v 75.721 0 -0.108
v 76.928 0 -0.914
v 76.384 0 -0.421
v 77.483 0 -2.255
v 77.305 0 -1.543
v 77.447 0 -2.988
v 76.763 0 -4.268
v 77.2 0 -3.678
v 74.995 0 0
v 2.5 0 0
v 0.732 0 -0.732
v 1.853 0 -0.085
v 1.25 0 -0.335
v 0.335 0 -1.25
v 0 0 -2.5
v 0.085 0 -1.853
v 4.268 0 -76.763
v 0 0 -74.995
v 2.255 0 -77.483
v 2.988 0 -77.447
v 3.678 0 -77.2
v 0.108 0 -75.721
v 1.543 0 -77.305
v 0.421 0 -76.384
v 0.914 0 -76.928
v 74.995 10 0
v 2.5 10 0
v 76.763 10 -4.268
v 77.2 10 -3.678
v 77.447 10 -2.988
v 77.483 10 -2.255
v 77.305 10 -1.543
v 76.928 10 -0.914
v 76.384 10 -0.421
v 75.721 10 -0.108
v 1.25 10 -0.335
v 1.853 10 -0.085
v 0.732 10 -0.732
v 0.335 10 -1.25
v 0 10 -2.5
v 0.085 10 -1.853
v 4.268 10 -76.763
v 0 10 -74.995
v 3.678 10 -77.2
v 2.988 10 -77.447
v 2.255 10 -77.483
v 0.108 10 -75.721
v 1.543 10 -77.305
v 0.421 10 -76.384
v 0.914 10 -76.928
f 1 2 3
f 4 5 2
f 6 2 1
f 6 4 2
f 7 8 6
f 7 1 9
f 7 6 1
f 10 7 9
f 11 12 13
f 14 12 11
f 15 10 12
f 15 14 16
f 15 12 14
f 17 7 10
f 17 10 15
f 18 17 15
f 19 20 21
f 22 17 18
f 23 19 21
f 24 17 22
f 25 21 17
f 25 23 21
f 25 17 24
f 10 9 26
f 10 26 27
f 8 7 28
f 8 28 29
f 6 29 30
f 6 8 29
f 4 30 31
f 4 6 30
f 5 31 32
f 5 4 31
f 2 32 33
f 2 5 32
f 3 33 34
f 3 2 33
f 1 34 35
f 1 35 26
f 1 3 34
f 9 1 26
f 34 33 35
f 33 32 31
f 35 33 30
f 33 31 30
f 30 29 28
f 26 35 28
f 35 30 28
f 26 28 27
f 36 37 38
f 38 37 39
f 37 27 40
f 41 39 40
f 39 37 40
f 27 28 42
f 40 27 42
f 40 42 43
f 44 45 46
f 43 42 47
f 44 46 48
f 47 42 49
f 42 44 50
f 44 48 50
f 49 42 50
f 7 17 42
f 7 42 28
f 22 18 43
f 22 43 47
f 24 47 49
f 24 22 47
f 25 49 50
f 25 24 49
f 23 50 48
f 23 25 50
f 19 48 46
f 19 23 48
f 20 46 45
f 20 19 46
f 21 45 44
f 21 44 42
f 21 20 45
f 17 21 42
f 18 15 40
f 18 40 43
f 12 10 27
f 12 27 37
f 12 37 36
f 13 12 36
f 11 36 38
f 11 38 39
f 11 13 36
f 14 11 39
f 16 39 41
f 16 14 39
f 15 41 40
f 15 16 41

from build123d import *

# Parameters (mm, degrees)
BOSS_EXTRUDE1_DEPTH = 10


with BuildPart() as part:
    # Sketch2 → Boss-Extrude1 (new body)
    with BuildSketch(Plane(origin=(0, 0, 0), x_dir=(1, 0, 0), z_dir=(0, 1, 0))):
        with BuildLine():
            Line((4.267766953, 76.762899821), (76.762899821, 4.267766953))
            ThreePointArc((76.762899821, 4.267766953), (77.304831699, 1.543291419), (74.995132868, 0))
            Line((74.995132868, 0), (2.5, 0))
            ThreePointArc((2.5, 0), (0.732233047, 0.732233047), (0, 2.5))
            Line((0, 2.5), (0, 74.995132868))
            ThreePointArc((0, 74.995132868), (1.543291419, 77.304831699), (4.267766953, 76.762899821))
        make_face()
    extrude(amount=BOSS_EXTRUDE1_DEPTH)


solid = part.part
